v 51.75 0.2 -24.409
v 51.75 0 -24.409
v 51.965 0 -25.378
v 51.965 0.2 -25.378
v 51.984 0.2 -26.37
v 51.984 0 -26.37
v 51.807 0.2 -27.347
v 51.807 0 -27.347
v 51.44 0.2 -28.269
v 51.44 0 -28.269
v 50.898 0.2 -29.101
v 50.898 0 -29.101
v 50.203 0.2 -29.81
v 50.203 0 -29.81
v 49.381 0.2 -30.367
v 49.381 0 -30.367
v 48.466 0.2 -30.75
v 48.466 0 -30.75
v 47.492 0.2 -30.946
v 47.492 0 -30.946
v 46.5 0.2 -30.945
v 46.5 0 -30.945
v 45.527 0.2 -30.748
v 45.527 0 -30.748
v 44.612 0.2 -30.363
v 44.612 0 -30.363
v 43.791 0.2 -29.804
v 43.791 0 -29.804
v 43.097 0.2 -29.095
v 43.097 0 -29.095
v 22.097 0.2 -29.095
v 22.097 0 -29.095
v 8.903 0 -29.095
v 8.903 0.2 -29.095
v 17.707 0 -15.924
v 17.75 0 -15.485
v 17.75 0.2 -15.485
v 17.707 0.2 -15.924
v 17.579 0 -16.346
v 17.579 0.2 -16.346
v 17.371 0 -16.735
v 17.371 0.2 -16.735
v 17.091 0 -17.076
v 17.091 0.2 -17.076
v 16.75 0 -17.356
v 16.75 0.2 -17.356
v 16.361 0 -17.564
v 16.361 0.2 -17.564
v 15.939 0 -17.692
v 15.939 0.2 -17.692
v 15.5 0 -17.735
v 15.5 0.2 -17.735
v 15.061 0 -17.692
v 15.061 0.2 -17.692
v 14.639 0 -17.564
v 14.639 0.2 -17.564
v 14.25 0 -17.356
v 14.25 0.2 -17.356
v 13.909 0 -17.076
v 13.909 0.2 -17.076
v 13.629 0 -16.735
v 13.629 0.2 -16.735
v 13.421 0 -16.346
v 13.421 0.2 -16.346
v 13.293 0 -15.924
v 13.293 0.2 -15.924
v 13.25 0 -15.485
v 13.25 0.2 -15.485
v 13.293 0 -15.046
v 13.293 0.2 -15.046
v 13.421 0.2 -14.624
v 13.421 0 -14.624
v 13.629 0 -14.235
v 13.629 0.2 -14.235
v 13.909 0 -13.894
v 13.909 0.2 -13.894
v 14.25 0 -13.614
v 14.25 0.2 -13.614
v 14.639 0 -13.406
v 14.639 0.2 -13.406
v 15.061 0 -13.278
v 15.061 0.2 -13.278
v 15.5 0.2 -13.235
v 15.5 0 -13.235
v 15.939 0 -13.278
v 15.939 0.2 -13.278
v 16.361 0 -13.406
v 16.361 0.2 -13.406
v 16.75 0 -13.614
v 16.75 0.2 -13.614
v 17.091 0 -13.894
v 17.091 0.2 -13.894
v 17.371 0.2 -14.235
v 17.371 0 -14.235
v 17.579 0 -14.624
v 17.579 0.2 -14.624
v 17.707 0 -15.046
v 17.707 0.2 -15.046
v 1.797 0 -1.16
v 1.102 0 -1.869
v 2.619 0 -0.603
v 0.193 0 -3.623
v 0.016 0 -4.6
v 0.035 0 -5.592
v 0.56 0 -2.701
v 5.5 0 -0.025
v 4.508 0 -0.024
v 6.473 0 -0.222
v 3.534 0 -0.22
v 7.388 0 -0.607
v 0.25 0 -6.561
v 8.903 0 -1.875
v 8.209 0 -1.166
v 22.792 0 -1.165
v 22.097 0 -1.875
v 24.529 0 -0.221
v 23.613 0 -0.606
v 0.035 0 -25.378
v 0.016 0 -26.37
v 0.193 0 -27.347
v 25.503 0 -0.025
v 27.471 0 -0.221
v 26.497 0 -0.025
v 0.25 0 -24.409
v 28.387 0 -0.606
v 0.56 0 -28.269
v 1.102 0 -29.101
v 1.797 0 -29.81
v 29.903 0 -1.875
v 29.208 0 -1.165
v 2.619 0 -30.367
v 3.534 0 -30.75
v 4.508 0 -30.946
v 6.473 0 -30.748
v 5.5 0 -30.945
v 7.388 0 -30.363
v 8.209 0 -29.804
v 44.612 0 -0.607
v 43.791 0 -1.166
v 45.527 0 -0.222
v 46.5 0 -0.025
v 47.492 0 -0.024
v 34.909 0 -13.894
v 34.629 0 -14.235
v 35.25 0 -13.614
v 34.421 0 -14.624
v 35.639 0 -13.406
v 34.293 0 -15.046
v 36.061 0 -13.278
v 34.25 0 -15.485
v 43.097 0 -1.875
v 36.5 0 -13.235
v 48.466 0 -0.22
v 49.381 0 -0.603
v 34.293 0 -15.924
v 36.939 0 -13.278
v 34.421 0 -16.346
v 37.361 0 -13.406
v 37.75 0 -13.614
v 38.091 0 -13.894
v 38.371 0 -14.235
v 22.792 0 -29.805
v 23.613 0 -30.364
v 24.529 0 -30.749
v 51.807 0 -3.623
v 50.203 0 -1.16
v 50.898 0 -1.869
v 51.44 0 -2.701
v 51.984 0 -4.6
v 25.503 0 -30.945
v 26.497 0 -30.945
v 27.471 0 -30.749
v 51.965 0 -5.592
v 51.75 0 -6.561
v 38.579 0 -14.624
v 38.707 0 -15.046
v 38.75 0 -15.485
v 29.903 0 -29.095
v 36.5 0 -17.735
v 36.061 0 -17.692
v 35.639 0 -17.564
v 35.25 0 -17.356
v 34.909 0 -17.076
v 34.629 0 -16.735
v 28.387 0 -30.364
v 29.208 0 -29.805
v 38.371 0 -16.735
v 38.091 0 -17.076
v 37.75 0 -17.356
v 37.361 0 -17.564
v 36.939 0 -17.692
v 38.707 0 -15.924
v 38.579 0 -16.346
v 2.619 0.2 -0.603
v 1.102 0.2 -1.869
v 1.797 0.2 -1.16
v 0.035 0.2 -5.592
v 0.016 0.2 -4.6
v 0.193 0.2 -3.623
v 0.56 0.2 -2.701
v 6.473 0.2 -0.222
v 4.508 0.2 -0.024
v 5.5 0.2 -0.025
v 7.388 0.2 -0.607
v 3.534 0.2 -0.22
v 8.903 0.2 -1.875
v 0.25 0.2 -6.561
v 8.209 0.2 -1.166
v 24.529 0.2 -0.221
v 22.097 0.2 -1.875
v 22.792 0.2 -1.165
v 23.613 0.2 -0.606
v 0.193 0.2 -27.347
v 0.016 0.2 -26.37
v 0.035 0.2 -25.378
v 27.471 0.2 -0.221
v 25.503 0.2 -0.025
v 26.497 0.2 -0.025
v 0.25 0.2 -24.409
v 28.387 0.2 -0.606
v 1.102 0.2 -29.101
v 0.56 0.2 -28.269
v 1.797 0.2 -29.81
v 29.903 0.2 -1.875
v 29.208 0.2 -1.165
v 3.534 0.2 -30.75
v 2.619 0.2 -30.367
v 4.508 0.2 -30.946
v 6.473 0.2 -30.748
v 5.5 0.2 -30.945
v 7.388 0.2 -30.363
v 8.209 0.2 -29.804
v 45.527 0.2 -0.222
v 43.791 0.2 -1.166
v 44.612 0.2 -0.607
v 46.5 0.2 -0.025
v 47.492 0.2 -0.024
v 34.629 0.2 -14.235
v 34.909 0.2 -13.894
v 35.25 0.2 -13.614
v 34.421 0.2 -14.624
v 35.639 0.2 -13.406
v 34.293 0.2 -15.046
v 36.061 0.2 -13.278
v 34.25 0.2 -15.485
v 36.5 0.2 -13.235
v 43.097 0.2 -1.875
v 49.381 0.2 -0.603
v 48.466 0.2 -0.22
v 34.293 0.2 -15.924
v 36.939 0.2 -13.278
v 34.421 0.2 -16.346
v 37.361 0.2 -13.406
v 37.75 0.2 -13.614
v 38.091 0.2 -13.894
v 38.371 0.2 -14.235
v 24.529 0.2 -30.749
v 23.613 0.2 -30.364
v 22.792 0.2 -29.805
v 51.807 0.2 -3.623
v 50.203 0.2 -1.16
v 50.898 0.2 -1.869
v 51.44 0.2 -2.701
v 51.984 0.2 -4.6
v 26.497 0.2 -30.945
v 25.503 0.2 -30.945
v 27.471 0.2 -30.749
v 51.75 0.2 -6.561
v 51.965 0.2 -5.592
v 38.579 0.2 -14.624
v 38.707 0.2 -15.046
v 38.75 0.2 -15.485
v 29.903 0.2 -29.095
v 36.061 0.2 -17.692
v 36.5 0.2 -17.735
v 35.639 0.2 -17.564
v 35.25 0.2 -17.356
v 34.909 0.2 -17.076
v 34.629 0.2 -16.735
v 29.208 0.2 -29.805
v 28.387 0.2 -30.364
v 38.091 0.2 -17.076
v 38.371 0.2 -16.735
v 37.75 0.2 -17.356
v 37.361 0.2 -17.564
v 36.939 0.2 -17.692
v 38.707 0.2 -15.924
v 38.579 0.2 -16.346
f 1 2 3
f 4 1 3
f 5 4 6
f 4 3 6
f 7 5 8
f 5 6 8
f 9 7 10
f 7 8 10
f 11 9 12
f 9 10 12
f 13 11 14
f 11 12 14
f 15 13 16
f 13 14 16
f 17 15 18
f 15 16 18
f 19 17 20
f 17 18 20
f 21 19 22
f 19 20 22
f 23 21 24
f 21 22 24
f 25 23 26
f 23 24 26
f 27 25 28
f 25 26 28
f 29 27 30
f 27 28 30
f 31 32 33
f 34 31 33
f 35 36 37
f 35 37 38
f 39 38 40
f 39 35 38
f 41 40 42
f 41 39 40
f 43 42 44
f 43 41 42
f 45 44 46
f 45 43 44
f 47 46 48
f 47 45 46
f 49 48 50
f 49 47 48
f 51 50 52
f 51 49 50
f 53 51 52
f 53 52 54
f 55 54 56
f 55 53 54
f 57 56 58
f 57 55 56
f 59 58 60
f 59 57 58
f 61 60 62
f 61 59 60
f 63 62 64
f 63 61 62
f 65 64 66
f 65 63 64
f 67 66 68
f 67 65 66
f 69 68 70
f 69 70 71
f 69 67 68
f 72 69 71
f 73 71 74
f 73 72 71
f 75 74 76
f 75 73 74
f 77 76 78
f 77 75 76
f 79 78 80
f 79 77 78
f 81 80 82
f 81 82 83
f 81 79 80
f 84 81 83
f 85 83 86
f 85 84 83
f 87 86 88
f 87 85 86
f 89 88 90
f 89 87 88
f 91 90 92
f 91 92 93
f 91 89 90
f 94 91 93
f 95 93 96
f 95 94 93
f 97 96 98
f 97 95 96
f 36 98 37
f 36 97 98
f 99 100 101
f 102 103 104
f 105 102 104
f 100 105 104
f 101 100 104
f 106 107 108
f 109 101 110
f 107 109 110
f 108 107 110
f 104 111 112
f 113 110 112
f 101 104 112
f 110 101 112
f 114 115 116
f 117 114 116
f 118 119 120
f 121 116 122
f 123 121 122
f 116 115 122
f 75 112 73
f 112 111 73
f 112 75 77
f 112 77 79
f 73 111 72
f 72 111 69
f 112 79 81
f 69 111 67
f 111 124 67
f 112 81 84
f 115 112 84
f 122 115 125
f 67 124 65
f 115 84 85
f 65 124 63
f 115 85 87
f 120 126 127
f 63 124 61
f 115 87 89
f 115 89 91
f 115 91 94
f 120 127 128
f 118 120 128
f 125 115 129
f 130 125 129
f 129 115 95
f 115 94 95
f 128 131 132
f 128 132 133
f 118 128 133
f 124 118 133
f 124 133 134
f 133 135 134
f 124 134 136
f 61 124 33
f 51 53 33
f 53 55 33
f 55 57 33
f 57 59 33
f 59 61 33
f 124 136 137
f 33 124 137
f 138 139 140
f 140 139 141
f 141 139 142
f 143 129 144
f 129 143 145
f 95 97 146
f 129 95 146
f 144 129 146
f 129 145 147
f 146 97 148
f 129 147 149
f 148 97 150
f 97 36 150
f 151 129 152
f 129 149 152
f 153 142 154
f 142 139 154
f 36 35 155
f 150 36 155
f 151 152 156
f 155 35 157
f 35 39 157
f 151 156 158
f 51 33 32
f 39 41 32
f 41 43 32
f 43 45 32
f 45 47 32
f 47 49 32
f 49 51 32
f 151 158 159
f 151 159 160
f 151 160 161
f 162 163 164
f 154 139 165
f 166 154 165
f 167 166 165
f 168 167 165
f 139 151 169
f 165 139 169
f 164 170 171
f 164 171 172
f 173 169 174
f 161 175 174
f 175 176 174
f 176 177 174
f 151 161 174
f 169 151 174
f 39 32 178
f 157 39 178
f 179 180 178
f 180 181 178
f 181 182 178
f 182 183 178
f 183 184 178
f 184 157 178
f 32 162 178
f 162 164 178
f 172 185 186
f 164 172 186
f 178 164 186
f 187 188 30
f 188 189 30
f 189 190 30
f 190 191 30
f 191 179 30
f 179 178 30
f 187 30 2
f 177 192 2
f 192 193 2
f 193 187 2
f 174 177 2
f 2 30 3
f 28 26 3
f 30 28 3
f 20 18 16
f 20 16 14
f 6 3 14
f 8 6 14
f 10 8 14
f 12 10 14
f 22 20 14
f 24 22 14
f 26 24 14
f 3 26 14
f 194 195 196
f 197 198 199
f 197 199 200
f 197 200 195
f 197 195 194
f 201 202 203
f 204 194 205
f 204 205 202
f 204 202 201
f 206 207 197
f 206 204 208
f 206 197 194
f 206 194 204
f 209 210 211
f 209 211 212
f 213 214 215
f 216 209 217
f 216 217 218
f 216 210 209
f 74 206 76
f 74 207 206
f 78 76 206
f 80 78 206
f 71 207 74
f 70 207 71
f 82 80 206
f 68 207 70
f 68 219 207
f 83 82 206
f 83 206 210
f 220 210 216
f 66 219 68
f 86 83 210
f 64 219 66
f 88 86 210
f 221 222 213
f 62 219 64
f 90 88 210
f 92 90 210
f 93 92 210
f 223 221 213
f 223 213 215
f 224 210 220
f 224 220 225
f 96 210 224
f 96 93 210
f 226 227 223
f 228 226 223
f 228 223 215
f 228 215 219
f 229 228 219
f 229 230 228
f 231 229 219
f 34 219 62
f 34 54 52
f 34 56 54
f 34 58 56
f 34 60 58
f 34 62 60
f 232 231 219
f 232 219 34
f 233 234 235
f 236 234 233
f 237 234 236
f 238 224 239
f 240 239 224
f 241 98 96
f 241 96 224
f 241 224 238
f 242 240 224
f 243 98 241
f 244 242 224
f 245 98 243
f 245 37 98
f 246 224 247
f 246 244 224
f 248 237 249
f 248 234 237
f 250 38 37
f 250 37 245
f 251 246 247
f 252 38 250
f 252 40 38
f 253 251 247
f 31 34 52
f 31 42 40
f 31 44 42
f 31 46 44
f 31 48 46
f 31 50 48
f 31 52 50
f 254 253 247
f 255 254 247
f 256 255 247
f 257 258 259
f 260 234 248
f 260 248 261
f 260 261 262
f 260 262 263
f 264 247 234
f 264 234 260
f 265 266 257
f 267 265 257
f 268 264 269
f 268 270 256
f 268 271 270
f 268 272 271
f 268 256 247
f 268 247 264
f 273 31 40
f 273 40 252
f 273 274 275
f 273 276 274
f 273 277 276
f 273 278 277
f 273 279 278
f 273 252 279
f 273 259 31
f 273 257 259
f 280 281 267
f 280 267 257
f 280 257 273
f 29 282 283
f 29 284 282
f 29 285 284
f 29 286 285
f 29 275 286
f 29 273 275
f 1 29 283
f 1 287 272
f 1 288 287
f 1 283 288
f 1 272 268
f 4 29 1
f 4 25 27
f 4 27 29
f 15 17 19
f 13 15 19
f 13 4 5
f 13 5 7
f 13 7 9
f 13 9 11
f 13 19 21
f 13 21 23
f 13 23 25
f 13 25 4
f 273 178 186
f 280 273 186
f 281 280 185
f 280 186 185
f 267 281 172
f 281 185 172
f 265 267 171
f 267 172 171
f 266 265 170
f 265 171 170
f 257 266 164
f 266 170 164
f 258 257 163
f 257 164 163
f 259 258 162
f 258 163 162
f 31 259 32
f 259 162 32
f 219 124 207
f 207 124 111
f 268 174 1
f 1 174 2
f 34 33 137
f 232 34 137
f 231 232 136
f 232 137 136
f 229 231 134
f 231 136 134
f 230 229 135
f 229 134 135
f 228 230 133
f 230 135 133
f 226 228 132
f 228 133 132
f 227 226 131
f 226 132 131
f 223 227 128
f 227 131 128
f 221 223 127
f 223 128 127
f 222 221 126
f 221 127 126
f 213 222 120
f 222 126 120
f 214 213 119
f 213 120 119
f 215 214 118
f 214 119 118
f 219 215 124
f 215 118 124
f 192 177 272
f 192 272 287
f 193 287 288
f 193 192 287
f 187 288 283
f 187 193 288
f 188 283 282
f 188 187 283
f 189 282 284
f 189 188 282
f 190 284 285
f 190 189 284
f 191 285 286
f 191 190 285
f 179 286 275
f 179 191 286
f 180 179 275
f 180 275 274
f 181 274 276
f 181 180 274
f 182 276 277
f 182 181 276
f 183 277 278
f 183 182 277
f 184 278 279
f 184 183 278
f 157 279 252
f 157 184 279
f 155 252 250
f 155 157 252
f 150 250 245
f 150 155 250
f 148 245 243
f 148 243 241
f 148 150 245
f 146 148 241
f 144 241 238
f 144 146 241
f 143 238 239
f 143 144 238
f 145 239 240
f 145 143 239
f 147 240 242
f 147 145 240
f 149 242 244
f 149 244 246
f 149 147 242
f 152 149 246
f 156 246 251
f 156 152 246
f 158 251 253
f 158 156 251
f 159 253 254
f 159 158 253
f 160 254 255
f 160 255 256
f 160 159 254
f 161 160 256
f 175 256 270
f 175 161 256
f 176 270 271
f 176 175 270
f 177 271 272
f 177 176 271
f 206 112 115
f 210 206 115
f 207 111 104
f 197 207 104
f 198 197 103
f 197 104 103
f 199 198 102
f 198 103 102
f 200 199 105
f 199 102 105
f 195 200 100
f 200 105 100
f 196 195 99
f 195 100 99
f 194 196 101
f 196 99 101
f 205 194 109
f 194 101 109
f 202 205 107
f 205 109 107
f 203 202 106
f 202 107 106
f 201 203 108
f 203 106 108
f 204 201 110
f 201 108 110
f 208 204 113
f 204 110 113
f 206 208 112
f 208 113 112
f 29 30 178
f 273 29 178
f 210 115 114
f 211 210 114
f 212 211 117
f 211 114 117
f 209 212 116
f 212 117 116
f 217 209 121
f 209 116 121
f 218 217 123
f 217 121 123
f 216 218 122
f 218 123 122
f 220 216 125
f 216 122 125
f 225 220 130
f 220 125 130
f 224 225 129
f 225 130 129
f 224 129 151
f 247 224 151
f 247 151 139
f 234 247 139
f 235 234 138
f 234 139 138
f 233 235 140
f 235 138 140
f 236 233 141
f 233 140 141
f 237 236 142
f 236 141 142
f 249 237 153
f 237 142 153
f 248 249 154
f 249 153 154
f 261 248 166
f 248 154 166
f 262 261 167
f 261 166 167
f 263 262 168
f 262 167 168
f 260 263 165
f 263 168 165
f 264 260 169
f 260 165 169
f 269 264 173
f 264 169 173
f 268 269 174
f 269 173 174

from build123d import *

# Parameters (mm, degrees)
SKETCH1_R           = 2.25
BOSS_EXTRUDE1_DEPTH = 0.2


with BuildPart() as part:
    # Sketch1 → Boss-Extrude1 (new body)
    with BuildSketch(Plane(origin=(0, 0, 0), x_dir=(1, 0, 0), z_dir=(0, 1, 0))):
        with BuildLine():
            Line((0.25, 24.4087505), (0.25, 6.5612495))
            ThreePointArc((0.25, 6.5612495), (2.618921791, 0.603357354), (8.903123749, 1.875))
            Line((8.903123749, 1.875), (22.096876251, 1.875))
            ThreePointArc((22.096876251, 1.875), (26, 0), (29.903123749, 1.875))
            Line((29.903123749, 1.875), (43.096876251, 1.875))
            ThreePointArc((43.096876251, 1.875), (49.381078209, 0.603357354), (51.75, 6.5612495))
            Line((51.75, 6.5612495), (51.75, 24.4087505))
            ThreePointArc((51.75, 24.4087505), (49.381078209, 30.366642646), (43.096876251, 29.095))
            Line((43.096876251, 29.095), (29.903123749, 29.095))
            ThreePointArc((29.903123749, 29.095), (26, 30.97), (22.096876251, 29.095))
            Line((22.096876251, 29.095), (8.903123749, 29.095))
            ThreePointArc((8.903123749, 29.095), (2.618921791, 30.366642646), (0.25, 24.4087505))
        make_face()
        with Locations((15.5, 15.485)):
            Circle(SKETCH1_R, mode=Mode.SUBTRACT)
        with Locations((36.5, 15.485)):
            Circle(SKETCH1_R, mode=Mode.SUBTRACT)
    extrude(amount=BOSS_EXTRUDE1_DEPTH)


solid = part.part
